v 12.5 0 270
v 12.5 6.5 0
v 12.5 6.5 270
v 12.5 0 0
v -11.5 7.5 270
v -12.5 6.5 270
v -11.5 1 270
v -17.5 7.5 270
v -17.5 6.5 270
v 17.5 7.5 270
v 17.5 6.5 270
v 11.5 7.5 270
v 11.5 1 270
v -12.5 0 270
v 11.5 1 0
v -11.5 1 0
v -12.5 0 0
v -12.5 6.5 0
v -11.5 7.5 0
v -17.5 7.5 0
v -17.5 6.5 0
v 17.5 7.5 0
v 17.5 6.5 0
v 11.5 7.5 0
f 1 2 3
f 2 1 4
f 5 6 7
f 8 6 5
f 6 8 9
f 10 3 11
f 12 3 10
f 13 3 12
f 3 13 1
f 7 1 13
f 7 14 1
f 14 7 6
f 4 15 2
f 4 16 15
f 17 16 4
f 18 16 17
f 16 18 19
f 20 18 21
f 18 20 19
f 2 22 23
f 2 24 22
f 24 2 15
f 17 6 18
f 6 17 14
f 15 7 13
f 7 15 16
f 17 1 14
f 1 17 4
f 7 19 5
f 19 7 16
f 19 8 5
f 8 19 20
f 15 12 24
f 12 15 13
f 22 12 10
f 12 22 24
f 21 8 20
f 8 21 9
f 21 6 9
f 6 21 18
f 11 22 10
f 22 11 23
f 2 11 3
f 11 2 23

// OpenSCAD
// HUB75 display case component: din_rail
include <../config/project_config.scad>

module din_rail_3d(length=din_length) {
    // Vereenvoudigde maar herkenbare TS35x7.5-hoedvorm:
    // narrow center web against the panel, two upright walls
    // and two outward-formed lips.
    color(color_din)
    union() {
        center_half = din_center_web_width/2;
        totaal_half = din_width/2;

        // Center web directly against the panel
        translate([-center_half,0,0])
            cube([din_center_web_width,din_thickness,length]);

        // Opstaande zijwanden
        translate([-center_half,0,0])
            cube([din_thickness,din_height,length]);
        translate([center_half-din_thickness,0,0])
            cube([din_thickness,din_height,length]);

        // Formed lips facing outward
        translate([-totaal_half,din_height-din_thickness,0])
            cube([din_lip_width,din_thickness,length]);
        translate([totaal_half-din_lip_width,din_height-din_thickness,0])
            cube([din_lip_width,din_thickness,length]);
    }
}

/* [Standalone preview] */
preview_length = din_length;
din_rail_3d(preview_length);
